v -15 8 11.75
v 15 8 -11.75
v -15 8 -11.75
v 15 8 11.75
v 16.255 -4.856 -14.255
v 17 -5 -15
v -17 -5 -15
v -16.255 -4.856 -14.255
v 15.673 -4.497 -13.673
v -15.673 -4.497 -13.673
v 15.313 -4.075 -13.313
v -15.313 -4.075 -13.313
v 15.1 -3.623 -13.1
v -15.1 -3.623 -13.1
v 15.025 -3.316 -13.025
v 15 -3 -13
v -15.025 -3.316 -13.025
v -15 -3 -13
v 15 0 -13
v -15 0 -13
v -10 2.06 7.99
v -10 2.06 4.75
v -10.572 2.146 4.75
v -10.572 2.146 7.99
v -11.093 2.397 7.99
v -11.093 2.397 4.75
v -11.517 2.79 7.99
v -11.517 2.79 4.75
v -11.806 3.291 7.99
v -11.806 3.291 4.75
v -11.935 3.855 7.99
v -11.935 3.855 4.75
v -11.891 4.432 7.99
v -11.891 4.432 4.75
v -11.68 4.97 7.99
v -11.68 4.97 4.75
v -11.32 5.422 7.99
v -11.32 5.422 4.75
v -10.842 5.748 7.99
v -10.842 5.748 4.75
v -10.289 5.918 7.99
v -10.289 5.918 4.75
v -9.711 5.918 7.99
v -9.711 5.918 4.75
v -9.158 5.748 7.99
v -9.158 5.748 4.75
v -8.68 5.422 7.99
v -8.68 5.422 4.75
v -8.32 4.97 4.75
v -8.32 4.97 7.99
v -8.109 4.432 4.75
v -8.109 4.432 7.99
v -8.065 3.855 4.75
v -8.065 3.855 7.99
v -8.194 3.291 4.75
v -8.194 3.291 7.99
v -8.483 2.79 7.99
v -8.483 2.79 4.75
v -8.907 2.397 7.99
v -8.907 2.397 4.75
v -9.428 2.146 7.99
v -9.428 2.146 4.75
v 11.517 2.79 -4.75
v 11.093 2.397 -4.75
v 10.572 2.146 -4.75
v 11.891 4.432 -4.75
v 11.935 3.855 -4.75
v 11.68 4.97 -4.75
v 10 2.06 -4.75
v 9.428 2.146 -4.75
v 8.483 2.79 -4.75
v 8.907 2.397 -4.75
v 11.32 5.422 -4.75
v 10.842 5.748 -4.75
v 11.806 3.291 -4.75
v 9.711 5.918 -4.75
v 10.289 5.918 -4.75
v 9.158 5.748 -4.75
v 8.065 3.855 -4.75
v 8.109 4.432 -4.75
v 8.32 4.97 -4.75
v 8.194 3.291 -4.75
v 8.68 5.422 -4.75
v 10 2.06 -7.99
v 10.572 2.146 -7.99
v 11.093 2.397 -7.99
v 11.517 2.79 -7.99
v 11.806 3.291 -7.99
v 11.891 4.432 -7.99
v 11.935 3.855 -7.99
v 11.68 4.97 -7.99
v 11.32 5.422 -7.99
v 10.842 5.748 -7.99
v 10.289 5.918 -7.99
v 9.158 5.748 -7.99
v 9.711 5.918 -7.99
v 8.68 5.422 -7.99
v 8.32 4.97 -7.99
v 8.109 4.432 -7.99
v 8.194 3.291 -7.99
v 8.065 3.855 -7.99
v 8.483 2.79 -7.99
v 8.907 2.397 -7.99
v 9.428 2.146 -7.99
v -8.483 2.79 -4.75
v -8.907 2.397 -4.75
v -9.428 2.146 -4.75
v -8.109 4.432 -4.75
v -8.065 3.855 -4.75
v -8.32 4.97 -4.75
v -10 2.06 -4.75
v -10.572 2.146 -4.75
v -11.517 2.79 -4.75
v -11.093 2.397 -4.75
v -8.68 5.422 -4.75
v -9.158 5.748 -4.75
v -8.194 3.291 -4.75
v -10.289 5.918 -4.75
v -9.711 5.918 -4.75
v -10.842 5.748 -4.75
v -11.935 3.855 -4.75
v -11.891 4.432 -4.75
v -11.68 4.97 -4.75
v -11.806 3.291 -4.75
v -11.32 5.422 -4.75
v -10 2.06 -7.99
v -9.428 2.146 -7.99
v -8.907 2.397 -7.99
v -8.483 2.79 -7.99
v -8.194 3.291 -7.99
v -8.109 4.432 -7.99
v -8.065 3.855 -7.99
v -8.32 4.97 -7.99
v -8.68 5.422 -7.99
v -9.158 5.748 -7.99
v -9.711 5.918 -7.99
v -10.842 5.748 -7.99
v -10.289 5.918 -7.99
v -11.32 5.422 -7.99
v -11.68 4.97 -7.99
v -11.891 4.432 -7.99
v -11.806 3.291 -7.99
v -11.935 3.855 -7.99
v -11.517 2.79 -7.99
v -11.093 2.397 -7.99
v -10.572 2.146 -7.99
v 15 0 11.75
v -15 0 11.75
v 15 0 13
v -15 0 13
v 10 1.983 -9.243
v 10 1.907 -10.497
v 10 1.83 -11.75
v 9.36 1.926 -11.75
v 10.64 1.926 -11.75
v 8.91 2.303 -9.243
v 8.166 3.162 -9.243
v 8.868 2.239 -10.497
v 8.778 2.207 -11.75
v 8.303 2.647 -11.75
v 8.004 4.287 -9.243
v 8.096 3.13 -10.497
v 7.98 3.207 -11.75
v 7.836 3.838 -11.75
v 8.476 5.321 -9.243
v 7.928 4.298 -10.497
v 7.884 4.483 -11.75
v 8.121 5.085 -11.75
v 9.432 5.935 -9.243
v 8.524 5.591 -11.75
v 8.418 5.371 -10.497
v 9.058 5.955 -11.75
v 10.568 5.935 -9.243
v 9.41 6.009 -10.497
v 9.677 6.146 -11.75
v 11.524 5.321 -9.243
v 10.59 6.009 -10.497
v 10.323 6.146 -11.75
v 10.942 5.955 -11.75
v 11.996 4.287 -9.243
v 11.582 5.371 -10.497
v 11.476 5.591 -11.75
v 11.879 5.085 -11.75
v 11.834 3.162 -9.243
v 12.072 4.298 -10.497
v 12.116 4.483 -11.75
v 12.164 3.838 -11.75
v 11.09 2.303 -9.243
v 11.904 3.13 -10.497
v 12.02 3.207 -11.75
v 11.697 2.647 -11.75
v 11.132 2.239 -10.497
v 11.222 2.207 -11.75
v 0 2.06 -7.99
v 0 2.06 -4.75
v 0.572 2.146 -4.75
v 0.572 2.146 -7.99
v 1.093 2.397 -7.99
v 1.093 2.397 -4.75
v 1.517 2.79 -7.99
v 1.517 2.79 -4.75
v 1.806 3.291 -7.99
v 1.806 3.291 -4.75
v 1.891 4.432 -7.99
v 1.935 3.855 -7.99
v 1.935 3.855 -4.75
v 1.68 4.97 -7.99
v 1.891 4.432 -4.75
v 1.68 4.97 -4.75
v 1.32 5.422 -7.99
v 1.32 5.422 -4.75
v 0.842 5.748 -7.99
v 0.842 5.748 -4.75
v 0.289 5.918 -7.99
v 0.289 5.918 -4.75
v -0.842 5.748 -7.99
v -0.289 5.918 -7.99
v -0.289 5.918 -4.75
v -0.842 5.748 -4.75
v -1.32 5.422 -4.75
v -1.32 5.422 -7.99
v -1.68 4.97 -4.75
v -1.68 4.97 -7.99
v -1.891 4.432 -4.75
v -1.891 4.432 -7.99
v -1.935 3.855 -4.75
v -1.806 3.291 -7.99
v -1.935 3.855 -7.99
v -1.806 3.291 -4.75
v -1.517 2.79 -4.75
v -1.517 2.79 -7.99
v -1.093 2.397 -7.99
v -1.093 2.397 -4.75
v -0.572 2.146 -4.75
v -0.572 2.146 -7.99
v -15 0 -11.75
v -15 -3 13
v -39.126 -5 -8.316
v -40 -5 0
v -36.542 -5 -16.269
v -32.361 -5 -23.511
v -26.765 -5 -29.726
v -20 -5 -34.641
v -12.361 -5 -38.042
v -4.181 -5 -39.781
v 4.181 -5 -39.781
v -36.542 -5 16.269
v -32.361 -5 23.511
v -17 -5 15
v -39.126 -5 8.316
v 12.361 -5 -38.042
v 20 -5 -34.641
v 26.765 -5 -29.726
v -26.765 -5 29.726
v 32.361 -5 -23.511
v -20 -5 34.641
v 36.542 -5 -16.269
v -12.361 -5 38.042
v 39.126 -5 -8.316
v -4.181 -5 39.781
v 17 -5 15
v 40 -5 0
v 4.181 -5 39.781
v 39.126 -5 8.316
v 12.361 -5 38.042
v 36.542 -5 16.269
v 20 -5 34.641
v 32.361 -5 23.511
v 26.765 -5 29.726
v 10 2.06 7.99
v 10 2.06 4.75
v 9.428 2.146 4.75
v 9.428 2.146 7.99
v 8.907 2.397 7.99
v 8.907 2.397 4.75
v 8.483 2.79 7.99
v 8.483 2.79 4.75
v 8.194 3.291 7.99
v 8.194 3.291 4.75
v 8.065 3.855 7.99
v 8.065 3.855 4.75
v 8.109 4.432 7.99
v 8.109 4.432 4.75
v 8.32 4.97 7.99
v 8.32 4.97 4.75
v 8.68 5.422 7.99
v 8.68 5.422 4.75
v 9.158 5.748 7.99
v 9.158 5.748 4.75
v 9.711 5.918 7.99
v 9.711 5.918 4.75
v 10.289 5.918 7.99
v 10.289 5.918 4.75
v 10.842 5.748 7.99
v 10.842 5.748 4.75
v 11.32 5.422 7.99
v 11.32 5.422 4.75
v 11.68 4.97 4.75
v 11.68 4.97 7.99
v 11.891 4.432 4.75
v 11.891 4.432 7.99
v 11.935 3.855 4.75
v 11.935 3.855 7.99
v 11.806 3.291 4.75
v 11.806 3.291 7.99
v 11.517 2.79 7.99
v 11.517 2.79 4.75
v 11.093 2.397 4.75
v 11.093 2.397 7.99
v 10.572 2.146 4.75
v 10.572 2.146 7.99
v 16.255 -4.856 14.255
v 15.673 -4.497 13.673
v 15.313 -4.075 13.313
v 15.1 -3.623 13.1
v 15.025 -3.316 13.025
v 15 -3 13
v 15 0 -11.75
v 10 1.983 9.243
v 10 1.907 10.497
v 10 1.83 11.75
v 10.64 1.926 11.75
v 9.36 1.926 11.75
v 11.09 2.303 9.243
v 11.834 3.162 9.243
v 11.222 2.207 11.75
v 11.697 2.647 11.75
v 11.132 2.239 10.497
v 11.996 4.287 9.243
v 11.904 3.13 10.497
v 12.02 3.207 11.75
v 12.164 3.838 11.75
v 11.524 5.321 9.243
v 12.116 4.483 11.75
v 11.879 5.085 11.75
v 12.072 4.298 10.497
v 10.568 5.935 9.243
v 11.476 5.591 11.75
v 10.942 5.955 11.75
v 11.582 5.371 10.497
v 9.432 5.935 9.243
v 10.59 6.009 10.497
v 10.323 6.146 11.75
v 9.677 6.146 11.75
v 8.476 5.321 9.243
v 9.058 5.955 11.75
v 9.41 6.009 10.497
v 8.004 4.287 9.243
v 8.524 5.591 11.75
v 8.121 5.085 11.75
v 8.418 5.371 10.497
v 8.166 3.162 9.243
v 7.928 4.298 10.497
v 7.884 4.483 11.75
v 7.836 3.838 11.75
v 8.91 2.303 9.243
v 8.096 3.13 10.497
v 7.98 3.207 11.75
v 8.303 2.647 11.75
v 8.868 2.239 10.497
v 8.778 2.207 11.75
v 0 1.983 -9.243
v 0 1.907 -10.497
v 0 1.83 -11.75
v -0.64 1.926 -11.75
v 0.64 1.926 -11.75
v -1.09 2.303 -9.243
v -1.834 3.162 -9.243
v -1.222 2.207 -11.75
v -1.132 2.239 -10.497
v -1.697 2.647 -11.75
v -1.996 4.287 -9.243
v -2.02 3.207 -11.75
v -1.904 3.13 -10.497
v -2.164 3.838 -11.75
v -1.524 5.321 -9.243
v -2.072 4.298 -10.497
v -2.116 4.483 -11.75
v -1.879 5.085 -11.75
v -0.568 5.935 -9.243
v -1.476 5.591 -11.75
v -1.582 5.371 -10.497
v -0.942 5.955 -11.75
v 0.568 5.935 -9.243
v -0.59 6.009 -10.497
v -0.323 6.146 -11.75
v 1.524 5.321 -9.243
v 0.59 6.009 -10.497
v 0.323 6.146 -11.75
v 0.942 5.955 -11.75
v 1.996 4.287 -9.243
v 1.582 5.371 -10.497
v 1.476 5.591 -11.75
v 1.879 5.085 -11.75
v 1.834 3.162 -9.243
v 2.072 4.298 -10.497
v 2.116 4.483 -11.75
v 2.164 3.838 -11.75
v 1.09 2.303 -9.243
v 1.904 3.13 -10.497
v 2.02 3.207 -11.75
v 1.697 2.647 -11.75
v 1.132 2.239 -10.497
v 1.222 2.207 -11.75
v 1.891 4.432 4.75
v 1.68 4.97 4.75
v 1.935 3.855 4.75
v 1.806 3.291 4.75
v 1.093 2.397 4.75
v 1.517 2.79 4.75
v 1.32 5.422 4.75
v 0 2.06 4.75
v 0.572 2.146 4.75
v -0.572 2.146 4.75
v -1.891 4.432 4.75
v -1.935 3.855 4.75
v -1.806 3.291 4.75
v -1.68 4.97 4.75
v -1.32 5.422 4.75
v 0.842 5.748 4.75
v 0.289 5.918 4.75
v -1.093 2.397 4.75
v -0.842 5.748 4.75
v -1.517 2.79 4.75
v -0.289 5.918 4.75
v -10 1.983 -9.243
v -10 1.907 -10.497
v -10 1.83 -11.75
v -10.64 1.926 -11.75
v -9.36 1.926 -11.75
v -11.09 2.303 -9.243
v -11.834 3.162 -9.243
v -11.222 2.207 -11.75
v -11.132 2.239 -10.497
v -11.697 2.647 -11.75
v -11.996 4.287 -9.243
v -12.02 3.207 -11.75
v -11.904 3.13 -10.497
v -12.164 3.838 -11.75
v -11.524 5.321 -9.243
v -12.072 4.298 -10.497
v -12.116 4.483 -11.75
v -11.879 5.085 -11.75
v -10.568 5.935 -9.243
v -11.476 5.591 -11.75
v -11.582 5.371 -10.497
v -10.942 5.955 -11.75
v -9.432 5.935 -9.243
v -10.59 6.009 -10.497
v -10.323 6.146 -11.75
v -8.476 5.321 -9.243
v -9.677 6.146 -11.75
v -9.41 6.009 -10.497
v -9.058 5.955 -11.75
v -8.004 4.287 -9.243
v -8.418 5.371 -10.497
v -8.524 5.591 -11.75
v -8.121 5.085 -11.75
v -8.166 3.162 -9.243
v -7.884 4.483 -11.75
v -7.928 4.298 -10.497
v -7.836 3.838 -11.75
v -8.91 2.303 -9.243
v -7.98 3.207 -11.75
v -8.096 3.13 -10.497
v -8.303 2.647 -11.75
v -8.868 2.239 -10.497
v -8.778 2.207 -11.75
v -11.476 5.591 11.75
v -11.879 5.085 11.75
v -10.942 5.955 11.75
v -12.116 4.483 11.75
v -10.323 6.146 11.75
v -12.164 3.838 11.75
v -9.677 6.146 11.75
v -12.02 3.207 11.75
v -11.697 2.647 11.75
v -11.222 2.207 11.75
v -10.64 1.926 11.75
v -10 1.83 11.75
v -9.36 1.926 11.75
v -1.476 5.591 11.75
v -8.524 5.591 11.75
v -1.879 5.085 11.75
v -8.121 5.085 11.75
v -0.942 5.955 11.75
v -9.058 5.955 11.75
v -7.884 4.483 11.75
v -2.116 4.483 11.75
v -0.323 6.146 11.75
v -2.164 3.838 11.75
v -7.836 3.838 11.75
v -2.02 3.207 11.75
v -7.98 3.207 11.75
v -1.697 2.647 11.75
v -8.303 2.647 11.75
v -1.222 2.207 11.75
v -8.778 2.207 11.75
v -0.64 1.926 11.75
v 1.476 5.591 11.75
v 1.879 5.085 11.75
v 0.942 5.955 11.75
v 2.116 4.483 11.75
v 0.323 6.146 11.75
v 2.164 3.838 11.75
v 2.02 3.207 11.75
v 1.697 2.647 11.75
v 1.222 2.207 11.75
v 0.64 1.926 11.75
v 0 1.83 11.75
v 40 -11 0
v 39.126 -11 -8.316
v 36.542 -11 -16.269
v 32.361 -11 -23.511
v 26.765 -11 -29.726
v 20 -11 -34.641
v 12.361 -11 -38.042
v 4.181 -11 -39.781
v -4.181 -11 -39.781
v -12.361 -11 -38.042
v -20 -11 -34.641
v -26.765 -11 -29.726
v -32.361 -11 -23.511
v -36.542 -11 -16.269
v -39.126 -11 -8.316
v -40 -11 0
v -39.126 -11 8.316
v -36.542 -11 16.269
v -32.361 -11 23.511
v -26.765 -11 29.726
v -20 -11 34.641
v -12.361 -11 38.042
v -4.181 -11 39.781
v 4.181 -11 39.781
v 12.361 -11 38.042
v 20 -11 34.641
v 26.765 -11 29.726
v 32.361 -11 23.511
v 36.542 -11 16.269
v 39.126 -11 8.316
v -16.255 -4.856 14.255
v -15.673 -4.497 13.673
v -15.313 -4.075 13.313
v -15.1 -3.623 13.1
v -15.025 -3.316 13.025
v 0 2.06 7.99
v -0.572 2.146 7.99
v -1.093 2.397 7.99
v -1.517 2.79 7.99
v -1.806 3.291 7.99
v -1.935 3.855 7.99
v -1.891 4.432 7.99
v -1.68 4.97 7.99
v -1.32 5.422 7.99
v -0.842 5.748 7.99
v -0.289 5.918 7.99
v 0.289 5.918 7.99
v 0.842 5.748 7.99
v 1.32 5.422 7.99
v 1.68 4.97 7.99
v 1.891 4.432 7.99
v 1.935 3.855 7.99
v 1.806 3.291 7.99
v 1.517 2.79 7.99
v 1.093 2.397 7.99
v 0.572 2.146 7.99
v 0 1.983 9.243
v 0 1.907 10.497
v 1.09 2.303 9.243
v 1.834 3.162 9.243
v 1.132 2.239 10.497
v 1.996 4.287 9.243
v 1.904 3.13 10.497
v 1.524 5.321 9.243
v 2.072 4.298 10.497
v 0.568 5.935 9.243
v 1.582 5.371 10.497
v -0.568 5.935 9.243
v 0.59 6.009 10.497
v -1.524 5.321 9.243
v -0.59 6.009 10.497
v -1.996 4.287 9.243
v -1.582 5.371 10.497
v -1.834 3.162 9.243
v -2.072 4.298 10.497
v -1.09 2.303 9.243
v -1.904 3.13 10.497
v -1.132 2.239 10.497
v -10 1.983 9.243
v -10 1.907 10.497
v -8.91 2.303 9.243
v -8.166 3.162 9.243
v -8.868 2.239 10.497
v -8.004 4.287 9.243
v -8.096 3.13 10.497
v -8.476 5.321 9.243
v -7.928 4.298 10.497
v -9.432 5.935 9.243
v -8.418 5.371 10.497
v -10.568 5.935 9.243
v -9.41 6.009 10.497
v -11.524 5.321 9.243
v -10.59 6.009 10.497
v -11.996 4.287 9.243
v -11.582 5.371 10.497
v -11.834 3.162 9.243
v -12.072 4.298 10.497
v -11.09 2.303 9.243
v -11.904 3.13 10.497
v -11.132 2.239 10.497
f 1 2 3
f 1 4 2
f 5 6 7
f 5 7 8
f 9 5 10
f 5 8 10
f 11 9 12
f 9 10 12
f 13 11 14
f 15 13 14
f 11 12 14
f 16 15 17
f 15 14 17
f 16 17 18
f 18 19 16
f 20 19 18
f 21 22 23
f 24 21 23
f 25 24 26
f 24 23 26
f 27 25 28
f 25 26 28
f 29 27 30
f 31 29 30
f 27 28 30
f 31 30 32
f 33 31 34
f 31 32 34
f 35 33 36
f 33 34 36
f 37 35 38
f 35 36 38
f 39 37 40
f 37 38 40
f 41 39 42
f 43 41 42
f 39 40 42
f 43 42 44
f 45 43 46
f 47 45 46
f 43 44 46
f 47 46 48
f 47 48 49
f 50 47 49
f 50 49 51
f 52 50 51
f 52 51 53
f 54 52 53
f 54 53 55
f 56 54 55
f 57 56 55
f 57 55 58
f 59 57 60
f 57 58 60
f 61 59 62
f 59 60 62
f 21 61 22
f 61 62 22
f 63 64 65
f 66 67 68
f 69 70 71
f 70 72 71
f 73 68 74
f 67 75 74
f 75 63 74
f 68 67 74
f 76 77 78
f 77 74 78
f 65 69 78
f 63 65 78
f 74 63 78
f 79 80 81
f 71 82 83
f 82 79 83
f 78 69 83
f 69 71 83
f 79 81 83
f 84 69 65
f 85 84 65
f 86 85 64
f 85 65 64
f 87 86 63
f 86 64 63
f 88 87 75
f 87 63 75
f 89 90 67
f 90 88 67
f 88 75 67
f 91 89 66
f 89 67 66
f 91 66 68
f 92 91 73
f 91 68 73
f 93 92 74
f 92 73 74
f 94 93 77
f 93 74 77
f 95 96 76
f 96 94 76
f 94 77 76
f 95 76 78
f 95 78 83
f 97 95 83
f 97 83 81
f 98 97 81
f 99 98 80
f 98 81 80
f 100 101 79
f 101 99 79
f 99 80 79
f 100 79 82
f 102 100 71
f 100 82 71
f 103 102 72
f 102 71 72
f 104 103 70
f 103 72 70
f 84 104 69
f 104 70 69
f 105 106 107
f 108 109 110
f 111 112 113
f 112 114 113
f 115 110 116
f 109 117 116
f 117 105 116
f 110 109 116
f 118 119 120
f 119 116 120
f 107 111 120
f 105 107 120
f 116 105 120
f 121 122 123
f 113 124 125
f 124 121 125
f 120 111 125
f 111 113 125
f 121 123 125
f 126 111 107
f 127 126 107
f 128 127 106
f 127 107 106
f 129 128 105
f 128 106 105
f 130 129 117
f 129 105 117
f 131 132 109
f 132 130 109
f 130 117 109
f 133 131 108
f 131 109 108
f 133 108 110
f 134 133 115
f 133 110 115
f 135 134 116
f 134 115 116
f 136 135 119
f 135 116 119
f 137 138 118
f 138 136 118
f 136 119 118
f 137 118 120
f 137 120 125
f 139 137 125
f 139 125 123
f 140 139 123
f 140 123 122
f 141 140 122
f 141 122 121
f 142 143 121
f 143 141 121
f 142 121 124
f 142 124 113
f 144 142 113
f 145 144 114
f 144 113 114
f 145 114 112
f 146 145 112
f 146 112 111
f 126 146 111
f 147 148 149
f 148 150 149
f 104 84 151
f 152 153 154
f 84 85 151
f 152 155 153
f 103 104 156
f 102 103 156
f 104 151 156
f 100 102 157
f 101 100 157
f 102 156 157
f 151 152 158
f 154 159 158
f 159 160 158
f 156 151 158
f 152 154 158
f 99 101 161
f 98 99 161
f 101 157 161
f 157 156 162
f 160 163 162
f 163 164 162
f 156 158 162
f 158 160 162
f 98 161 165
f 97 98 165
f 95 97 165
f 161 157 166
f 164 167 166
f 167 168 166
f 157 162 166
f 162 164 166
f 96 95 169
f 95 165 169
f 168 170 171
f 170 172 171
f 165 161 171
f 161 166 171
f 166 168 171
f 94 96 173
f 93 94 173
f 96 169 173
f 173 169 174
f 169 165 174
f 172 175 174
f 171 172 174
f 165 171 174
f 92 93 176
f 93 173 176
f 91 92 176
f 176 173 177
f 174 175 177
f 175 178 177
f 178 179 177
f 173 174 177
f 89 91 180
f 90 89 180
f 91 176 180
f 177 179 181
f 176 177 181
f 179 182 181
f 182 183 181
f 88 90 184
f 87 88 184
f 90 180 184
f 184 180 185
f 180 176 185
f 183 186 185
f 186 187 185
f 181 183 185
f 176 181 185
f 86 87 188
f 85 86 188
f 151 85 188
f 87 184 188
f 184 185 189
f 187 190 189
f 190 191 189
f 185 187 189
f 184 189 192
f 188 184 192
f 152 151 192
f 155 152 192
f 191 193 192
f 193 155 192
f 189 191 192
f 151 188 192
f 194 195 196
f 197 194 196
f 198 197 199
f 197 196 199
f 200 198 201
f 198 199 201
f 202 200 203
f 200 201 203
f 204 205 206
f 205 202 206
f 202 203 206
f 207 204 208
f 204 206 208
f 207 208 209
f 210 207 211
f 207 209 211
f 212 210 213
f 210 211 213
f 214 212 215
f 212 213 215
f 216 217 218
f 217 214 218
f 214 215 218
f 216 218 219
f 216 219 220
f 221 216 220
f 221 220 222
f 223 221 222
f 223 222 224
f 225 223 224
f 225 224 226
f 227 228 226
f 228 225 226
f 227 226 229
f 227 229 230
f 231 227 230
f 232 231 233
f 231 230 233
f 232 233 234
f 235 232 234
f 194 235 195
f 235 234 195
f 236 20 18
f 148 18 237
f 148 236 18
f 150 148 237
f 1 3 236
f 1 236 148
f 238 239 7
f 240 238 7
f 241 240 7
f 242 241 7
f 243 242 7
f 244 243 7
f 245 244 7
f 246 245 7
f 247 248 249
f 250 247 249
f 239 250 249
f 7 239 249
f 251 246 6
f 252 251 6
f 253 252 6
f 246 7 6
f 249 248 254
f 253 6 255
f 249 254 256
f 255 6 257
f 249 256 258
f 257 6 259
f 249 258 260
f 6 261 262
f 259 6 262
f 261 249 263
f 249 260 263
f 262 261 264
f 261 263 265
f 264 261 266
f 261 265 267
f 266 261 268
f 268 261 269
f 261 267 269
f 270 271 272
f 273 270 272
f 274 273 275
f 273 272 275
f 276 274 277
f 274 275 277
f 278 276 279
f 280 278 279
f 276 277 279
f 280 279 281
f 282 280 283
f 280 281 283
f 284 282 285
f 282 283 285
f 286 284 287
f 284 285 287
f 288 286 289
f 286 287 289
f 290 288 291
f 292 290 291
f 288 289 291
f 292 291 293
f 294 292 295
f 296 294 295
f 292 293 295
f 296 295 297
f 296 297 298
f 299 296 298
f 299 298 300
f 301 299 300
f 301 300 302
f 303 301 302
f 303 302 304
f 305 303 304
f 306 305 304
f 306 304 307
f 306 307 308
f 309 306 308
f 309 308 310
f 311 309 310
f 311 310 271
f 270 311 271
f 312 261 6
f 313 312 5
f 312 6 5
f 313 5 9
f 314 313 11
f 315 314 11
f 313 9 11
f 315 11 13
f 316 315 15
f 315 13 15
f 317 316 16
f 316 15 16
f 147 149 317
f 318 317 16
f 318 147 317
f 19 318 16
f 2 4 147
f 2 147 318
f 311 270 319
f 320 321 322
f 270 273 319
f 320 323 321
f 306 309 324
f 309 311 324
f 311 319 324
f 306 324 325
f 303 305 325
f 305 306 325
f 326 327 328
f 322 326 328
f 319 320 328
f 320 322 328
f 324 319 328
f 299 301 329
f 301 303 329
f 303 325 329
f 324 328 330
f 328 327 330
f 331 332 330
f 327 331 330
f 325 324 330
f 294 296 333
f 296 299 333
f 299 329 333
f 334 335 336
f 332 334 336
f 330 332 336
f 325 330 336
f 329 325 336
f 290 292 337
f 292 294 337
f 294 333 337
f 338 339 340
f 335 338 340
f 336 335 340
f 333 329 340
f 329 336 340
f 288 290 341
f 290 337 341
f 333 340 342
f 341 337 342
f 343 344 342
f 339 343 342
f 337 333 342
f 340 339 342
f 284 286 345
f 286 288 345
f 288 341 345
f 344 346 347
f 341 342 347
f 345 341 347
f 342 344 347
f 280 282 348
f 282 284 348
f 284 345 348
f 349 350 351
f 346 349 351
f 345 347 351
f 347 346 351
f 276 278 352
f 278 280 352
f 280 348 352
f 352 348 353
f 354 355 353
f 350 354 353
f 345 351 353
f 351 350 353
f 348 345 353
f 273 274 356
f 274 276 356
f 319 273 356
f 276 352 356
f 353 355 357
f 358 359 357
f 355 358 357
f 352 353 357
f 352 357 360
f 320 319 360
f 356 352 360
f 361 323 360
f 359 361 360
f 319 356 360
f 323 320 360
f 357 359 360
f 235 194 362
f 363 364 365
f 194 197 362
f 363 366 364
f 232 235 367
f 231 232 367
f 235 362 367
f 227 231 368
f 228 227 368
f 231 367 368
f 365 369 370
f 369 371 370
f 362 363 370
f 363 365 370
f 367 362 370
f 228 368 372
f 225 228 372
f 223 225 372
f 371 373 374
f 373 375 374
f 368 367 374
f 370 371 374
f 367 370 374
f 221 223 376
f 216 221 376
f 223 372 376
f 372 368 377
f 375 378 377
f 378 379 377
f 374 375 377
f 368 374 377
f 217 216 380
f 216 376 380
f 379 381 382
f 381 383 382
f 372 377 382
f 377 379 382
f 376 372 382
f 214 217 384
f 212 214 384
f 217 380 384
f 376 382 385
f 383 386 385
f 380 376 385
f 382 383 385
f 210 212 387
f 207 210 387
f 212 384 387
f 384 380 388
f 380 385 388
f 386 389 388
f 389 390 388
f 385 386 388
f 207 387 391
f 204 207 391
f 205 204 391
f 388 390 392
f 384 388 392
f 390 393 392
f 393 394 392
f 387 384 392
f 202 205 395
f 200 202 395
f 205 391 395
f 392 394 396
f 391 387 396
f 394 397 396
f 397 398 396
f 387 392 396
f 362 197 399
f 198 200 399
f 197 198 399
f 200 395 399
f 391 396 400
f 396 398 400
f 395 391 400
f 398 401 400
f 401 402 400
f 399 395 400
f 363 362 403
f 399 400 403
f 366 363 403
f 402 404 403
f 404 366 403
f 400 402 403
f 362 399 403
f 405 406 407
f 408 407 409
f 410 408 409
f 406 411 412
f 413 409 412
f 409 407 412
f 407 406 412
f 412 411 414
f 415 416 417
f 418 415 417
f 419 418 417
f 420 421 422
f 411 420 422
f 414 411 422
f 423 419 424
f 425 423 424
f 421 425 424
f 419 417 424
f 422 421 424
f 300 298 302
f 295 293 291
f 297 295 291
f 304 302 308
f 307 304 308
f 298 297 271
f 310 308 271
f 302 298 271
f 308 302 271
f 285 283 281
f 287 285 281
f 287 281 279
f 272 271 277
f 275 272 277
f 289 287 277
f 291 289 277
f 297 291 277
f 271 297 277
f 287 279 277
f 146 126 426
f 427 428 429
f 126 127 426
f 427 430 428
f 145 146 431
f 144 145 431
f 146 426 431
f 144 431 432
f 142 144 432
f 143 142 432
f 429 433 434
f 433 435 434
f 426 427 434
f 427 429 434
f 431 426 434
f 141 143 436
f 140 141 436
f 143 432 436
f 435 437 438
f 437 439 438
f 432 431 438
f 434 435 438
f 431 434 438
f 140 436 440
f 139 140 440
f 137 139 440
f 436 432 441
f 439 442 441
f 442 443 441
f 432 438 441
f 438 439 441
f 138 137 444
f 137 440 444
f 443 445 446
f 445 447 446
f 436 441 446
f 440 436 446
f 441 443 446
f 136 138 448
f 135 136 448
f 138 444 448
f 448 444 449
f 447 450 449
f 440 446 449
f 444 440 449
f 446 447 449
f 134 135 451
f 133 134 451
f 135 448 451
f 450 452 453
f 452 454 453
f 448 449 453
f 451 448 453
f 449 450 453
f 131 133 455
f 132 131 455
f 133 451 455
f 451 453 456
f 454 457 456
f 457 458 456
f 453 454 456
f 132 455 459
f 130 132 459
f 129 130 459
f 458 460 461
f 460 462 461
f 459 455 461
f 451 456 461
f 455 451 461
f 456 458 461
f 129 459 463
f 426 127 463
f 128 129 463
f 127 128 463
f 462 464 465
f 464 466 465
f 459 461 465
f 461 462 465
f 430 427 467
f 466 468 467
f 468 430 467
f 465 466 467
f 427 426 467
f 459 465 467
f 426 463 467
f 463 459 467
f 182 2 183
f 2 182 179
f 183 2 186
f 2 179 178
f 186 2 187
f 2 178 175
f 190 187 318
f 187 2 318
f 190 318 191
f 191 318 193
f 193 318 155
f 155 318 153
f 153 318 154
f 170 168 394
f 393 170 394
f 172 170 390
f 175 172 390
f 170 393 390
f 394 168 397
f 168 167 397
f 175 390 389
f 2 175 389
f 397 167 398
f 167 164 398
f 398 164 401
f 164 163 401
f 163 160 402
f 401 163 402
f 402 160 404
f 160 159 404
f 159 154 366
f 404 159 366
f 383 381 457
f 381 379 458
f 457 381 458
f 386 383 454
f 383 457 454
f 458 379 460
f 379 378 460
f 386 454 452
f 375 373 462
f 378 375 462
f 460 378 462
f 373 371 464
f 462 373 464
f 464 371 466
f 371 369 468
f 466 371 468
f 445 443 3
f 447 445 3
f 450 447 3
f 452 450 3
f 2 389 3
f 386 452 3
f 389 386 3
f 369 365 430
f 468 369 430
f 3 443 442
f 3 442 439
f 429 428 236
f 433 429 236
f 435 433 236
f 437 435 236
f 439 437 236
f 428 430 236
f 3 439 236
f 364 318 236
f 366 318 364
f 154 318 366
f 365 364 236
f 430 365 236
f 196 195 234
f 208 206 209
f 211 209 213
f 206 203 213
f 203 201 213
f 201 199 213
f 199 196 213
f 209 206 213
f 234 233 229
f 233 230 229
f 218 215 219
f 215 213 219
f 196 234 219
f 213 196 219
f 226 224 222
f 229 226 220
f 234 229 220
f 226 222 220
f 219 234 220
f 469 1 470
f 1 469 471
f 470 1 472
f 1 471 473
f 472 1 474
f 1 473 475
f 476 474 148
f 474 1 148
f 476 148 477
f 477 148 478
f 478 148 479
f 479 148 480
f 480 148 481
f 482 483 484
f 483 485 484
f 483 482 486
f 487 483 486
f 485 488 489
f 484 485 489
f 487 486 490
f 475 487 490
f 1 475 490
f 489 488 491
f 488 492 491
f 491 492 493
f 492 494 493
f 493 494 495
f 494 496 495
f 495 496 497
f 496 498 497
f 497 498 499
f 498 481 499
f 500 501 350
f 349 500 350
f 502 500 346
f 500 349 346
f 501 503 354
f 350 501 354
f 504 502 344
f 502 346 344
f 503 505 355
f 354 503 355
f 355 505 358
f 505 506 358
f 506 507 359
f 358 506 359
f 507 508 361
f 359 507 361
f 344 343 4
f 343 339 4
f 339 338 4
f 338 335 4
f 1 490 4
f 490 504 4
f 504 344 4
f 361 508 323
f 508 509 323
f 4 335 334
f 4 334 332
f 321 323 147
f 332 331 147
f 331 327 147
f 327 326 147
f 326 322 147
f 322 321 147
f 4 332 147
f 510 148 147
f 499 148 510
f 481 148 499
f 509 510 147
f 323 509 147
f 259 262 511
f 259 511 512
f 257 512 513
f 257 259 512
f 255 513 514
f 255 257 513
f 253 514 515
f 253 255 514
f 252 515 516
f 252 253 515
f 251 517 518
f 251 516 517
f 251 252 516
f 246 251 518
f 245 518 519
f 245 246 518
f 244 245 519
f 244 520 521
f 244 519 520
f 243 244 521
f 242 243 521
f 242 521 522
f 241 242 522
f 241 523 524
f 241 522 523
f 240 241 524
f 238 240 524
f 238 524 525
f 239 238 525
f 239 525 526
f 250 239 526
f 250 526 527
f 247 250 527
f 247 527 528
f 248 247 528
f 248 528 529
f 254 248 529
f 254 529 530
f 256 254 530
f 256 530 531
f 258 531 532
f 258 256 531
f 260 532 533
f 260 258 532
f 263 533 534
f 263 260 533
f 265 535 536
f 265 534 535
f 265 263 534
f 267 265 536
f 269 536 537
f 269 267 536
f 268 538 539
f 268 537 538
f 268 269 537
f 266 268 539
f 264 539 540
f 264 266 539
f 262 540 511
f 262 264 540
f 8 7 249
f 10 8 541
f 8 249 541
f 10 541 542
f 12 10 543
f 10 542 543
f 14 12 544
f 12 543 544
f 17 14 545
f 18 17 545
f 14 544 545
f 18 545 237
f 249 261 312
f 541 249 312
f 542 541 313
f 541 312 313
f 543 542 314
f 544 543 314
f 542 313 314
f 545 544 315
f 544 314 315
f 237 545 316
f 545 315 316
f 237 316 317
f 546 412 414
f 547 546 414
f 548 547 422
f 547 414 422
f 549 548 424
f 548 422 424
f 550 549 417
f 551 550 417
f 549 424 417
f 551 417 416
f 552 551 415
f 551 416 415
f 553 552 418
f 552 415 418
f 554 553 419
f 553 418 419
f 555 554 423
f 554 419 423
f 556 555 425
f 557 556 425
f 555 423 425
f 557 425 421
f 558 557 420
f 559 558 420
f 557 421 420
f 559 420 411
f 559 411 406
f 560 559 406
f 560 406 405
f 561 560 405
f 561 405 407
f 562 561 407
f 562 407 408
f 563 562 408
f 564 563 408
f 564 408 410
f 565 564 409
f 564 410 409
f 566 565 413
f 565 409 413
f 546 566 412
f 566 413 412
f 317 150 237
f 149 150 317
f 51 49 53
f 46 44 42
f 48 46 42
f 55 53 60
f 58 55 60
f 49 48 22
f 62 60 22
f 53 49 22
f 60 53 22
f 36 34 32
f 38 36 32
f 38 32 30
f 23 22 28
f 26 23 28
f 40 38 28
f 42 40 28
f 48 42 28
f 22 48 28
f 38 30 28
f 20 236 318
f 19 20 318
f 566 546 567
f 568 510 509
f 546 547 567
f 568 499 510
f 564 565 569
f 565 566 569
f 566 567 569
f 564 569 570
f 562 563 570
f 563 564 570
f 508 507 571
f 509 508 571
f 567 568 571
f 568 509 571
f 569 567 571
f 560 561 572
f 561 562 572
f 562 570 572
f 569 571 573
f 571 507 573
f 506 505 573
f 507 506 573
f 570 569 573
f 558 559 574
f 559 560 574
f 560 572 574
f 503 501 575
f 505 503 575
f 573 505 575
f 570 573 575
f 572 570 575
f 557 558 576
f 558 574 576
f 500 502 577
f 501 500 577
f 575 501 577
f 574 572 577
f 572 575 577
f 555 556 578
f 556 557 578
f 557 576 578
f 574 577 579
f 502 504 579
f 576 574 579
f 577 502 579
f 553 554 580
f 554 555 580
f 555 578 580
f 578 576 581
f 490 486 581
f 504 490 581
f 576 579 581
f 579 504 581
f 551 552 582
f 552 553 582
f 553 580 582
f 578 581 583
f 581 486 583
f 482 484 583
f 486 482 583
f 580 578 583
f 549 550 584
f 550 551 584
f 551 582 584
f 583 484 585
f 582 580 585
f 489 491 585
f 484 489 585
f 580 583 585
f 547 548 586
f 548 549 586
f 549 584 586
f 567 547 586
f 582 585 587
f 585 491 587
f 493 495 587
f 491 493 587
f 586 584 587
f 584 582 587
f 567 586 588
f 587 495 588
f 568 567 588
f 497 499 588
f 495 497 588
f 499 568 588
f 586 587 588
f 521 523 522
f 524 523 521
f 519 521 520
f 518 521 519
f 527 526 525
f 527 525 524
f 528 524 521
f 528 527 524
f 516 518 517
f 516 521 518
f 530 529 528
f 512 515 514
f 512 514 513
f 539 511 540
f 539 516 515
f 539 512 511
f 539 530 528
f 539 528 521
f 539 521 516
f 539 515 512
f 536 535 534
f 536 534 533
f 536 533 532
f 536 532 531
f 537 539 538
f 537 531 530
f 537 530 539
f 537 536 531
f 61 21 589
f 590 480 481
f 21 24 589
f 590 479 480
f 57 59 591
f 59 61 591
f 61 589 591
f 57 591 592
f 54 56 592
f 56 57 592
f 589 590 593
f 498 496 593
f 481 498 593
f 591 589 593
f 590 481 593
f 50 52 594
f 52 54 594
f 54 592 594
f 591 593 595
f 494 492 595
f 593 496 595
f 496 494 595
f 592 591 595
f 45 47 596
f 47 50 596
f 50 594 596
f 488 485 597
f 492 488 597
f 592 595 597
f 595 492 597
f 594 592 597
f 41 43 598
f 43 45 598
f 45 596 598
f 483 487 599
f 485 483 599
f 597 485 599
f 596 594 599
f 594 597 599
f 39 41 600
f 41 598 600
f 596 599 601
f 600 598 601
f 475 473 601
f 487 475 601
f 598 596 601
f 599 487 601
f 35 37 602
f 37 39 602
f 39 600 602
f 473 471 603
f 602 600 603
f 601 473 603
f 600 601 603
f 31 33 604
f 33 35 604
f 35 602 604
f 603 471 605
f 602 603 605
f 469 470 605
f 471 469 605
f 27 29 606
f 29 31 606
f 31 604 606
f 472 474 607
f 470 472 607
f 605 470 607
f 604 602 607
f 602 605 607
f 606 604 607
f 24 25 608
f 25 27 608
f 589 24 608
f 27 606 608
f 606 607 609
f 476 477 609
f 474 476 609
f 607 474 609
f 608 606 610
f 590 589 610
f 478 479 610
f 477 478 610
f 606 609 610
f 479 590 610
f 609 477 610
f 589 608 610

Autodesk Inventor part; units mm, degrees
ref_plane "YZ Plane" through (0, 0, 0) normal (1, 0, 0) x (0, 1, 0)
ref_plane "XZ Plane" through (0, 0, 0) normal (0, 1, 0) x (-1, 0, 0)
ref_plane "XY Plane" through (0, 0, 0) normal (0, 0, 1) x (1, 0, 0)
sketch "Sketch1" plane through (0, 0, 0) normal (0, 1, 0) x (-1, 0, 0)
  line L0 (-15, 11.75) -> (-15, -11.75)
  line L1 (-15, -11.75) -> (15, -11.75)
  line L2 (15, -11.75) -> (15, 11.75)
  line L3 (15, 11.75) -> (-15, 11.75)
  line L4 (-15, 11.75) -> (15, -11.75) construction
  line L5 (-15, -11.75) -> (15, 11.75) construction
  point P0 (0, 0)
  dimension "d0" = 23.5
  dimension "d1" = 30
extrude "Extrusion1" add sketch "Sketch1" along normal blind 8
sketch "Sketch2" plane through (-15, 0, 11.75) normal (0, 0, 1) x (1, 0, 0)
  circle A0 centre (15, 4) radius 1.5
  line L0 (0, 8) -> (30, 8) projected
  point P0 (15, 0)
  dimension "d4" = 3
  dimension "d5" = 8
  dimension "d6" = 4
hole "Hole1" at (0, 4, 11.75) direction (0, 0, -1) diameter 3.88 depth 7 countersink diameter 4.34 countersink angle 7
pattern_linear "Rectangular Pattern1" count 2 spacing 10 along (1, 0, 0) count 2 spacing 10 along (-1, 0, 0) of "Hole1"
mirror "Mirror1" about plane through (0, 0, 0) normal (0, 0, 1) of "Hole1", "Rectangular Pattern1"
sketch "Sketch3" plane through (0, 0, 0) normal (0, -1, 0) x (1, 0, 0)
  line L0 (-15, -13) -> (-15, 13)
  line L1 (-15, 13) -> (15, 13)
  line L2 (15, 13) -> (15, -13)
  line L3 (15, -13) -> (-15, -13)
  line L4 (-15, -13) -> (15, 13) construction
  line L5 (-15, 13) -> (15, -13) construction
  point P0 (0, 0)
  dimension "d20" = 26
  dimension "d21" = 30
extrude "Extrusion2" add sketch "Sketch3" along normal blind 5
sketch "Sketch4" plane through (0, -5, 0) normal (0, -1, 0) x (1, 0, 0)
  circle A0 centre (0, 0) radius 40
  dimension "d24" = 80
extrude "Extrusion3" add sketch "Sketch4" along normal blind 6
fillet "Fillet1" radius 2 4 edges at (0, -5, 13) (15, -5, 0) (0, -5, -13) (-15, -5, 0)
equation "\"d6\" = 0.5 * d5"
properties part number "cycloid_fixing_base"
